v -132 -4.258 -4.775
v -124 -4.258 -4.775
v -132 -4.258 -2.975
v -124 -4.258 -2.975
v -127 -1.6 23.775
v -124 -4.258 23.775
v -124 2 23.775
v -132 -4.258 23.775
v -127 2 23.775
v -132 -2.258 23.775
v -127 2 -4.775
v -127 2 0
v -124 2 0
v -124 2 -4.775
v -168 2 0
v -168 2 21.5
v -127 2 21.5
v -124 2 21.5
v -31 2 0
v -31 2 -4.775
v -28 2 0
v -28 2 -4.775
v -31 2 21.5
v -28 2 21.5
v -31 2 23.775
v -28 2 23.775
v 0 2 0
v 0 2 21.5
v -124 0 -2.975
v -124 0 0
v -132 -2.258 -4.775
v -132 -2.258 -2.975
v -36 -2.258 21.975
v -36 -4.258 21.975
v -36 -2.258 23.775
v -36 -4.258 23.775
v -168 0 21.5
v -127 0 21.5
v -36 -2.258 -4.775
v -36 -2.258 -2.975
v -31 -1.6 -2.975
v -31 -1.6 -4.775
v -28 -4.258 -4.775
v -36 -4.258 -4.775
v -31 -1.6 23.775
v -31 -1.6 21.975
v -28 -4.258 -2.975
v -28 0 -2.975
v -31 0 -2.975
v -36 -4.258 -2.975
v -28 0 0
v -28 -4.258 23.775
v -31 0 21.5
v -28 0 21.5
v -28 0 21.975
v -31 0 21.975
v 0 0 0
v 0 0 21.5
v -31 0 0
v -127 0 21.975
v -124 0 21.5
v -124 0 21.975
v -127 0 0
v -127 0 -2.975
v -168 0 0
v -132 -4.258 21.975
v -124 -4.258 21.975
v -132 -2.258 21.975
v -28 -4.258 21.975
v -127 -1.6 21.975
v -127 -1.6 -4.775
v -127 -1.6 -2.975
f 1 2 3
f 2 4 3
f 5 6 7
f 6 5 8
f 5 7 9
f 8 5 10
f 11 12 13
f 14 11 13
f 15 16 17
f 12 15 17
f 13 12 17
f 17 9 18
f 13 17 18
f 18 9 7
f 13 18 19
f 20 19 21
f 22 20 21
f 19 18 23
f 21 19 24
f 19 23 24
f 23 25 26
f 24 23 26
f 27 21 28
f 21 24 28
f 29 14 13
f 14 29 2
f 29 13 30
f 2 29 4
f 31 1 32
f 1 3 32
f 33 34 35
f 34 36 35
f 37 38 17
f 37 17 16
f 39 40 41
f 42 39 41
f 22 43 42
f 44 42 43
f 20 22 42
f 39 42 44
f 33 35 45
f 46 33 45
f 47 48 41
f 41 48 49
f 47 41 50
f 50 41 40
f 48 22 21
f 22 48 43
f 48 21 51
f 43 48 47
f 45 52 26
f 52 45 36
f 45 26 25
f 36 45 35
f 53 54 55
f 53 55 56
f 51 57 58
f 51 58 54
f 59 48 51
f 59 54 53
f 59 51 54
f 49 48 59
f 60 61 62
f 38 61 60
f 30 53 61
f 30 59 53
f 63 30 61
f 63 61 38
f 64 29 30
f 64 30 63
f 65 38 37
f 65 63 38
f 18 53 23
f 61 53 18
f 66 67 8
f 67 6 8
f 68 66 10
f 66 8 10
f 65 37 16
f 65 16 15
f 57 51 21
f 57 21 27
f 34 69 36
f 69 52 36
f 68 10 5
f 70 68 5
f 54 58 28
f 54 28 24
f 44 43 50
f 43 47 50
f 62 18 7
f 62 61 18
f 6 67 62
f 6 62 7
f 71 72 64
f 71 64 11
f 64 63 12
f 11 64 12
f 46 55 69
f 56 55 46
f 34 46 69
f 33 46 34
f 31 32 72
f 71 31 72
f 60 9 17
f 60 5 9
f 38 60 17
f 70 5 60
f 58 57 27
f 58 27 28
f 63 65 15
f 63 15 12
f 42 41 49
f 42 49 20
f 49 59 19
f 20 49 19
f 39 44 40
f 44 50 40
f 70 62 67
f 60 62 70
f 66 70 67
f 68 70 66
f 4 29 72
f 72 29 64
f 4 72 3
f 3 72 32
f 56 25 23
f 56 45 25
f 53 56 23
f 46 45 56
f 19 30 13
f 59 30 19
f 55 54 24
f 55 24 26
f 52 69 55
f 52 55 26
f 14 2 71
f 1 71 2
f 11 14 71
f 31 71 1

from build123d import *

# Parameters (mm, degrees)
THICKNESS_EXTRUDE_DEPTH = 2
HOOK_1_EXTRUDE_DEPTH    = 0.9
HOOK_START              = -26.75
HOOK_2_EXTRUDE_DEPTH    = 0.9
HOOK_PATTERN_COUNT      = 2
HOOK_PATTERN_PITCH      = 96


with BuildPart() as part:
    # Top Sketch → Thickness Extrude (new body)
    with BuildSketch(Plane(origin=(0, 0, 0), x_dir=(1, 0, 0), z_dir=(0, 1, 0))):
        Polygon((-28, -21.5), (-28, -22.875), (-31, -22.875), (-31, -21.5), (-124, -21.5), (-124, -22.875), (-127, -22.875), (-127, -21.5), (-168, -21.5), (-168, 0), (-127, 0), (-127, 3.875), (-124, 3.875), (-124, 0), (-31, 0), (-31, 3.875), (-28, 3.875), (-28, 0), (0, 0), (0, -21.5), align=None)
    extrude(amount=THICKNESS_EXTRUDE_DEPTH)


with BuildPart() as body_2:
    # Hook Sketch → Hook 1 Extrude (new, symmetric)
    with BuildSketch(Plane.XY.offset(22.875)):
        Polygon((-31, 2), (-28, 2), (-28, -4.258262488), (-36, -4.258262488), (-36, -2.258262488), (-31, -1.6), align=None)
    hook_1_extrude = extrude(amount=HOOK_1_EXTRUDE_DEPTH, both=True)


with BuildPart() as body_3:
    # Hook Sketch<2> → Hook 2 Extrude (new, symmetric)
    with BuildSketch(Plane.XY.offset(22.875).offset(HOOK_START)):
        Polygon((-31, 2), (-28, 2), (-28, -4.258262488), (-36, -4.258262488), (-36, -2.258262488), (-31, -1.6), align=None)
    hook_2_extrude = extrude(amount=HOOK_2_EXTRUDE_DEPTH, both=True)


with BuildPart() as hook_pattern_1:
    # Hook Pattern: pattern copy
    add(hook_1_extrude.moved(Location(Vector(-1, 0, 0) * (1 * HOOK_PATTERN_PITCH))))


with BuildPart() as hook_pattern_2:
    # Hook Pattern: pattern copy
    add(hook_2_extrude.moved(Location(Vector(-1, 0, 0) * (1 * HOOK_PATTERN_PITCH))))


with BuildPart() as part_1:
    add(part.part)

    # Combine Bodies: union body 2, body 3, Hook Pattern_1, Hook Pattern_2
    add(body_2.part)
    add(body_3.part)
    add(hook_pattern_1.part)
    add(hook_pattern_2.part)


solid = part_1.part
